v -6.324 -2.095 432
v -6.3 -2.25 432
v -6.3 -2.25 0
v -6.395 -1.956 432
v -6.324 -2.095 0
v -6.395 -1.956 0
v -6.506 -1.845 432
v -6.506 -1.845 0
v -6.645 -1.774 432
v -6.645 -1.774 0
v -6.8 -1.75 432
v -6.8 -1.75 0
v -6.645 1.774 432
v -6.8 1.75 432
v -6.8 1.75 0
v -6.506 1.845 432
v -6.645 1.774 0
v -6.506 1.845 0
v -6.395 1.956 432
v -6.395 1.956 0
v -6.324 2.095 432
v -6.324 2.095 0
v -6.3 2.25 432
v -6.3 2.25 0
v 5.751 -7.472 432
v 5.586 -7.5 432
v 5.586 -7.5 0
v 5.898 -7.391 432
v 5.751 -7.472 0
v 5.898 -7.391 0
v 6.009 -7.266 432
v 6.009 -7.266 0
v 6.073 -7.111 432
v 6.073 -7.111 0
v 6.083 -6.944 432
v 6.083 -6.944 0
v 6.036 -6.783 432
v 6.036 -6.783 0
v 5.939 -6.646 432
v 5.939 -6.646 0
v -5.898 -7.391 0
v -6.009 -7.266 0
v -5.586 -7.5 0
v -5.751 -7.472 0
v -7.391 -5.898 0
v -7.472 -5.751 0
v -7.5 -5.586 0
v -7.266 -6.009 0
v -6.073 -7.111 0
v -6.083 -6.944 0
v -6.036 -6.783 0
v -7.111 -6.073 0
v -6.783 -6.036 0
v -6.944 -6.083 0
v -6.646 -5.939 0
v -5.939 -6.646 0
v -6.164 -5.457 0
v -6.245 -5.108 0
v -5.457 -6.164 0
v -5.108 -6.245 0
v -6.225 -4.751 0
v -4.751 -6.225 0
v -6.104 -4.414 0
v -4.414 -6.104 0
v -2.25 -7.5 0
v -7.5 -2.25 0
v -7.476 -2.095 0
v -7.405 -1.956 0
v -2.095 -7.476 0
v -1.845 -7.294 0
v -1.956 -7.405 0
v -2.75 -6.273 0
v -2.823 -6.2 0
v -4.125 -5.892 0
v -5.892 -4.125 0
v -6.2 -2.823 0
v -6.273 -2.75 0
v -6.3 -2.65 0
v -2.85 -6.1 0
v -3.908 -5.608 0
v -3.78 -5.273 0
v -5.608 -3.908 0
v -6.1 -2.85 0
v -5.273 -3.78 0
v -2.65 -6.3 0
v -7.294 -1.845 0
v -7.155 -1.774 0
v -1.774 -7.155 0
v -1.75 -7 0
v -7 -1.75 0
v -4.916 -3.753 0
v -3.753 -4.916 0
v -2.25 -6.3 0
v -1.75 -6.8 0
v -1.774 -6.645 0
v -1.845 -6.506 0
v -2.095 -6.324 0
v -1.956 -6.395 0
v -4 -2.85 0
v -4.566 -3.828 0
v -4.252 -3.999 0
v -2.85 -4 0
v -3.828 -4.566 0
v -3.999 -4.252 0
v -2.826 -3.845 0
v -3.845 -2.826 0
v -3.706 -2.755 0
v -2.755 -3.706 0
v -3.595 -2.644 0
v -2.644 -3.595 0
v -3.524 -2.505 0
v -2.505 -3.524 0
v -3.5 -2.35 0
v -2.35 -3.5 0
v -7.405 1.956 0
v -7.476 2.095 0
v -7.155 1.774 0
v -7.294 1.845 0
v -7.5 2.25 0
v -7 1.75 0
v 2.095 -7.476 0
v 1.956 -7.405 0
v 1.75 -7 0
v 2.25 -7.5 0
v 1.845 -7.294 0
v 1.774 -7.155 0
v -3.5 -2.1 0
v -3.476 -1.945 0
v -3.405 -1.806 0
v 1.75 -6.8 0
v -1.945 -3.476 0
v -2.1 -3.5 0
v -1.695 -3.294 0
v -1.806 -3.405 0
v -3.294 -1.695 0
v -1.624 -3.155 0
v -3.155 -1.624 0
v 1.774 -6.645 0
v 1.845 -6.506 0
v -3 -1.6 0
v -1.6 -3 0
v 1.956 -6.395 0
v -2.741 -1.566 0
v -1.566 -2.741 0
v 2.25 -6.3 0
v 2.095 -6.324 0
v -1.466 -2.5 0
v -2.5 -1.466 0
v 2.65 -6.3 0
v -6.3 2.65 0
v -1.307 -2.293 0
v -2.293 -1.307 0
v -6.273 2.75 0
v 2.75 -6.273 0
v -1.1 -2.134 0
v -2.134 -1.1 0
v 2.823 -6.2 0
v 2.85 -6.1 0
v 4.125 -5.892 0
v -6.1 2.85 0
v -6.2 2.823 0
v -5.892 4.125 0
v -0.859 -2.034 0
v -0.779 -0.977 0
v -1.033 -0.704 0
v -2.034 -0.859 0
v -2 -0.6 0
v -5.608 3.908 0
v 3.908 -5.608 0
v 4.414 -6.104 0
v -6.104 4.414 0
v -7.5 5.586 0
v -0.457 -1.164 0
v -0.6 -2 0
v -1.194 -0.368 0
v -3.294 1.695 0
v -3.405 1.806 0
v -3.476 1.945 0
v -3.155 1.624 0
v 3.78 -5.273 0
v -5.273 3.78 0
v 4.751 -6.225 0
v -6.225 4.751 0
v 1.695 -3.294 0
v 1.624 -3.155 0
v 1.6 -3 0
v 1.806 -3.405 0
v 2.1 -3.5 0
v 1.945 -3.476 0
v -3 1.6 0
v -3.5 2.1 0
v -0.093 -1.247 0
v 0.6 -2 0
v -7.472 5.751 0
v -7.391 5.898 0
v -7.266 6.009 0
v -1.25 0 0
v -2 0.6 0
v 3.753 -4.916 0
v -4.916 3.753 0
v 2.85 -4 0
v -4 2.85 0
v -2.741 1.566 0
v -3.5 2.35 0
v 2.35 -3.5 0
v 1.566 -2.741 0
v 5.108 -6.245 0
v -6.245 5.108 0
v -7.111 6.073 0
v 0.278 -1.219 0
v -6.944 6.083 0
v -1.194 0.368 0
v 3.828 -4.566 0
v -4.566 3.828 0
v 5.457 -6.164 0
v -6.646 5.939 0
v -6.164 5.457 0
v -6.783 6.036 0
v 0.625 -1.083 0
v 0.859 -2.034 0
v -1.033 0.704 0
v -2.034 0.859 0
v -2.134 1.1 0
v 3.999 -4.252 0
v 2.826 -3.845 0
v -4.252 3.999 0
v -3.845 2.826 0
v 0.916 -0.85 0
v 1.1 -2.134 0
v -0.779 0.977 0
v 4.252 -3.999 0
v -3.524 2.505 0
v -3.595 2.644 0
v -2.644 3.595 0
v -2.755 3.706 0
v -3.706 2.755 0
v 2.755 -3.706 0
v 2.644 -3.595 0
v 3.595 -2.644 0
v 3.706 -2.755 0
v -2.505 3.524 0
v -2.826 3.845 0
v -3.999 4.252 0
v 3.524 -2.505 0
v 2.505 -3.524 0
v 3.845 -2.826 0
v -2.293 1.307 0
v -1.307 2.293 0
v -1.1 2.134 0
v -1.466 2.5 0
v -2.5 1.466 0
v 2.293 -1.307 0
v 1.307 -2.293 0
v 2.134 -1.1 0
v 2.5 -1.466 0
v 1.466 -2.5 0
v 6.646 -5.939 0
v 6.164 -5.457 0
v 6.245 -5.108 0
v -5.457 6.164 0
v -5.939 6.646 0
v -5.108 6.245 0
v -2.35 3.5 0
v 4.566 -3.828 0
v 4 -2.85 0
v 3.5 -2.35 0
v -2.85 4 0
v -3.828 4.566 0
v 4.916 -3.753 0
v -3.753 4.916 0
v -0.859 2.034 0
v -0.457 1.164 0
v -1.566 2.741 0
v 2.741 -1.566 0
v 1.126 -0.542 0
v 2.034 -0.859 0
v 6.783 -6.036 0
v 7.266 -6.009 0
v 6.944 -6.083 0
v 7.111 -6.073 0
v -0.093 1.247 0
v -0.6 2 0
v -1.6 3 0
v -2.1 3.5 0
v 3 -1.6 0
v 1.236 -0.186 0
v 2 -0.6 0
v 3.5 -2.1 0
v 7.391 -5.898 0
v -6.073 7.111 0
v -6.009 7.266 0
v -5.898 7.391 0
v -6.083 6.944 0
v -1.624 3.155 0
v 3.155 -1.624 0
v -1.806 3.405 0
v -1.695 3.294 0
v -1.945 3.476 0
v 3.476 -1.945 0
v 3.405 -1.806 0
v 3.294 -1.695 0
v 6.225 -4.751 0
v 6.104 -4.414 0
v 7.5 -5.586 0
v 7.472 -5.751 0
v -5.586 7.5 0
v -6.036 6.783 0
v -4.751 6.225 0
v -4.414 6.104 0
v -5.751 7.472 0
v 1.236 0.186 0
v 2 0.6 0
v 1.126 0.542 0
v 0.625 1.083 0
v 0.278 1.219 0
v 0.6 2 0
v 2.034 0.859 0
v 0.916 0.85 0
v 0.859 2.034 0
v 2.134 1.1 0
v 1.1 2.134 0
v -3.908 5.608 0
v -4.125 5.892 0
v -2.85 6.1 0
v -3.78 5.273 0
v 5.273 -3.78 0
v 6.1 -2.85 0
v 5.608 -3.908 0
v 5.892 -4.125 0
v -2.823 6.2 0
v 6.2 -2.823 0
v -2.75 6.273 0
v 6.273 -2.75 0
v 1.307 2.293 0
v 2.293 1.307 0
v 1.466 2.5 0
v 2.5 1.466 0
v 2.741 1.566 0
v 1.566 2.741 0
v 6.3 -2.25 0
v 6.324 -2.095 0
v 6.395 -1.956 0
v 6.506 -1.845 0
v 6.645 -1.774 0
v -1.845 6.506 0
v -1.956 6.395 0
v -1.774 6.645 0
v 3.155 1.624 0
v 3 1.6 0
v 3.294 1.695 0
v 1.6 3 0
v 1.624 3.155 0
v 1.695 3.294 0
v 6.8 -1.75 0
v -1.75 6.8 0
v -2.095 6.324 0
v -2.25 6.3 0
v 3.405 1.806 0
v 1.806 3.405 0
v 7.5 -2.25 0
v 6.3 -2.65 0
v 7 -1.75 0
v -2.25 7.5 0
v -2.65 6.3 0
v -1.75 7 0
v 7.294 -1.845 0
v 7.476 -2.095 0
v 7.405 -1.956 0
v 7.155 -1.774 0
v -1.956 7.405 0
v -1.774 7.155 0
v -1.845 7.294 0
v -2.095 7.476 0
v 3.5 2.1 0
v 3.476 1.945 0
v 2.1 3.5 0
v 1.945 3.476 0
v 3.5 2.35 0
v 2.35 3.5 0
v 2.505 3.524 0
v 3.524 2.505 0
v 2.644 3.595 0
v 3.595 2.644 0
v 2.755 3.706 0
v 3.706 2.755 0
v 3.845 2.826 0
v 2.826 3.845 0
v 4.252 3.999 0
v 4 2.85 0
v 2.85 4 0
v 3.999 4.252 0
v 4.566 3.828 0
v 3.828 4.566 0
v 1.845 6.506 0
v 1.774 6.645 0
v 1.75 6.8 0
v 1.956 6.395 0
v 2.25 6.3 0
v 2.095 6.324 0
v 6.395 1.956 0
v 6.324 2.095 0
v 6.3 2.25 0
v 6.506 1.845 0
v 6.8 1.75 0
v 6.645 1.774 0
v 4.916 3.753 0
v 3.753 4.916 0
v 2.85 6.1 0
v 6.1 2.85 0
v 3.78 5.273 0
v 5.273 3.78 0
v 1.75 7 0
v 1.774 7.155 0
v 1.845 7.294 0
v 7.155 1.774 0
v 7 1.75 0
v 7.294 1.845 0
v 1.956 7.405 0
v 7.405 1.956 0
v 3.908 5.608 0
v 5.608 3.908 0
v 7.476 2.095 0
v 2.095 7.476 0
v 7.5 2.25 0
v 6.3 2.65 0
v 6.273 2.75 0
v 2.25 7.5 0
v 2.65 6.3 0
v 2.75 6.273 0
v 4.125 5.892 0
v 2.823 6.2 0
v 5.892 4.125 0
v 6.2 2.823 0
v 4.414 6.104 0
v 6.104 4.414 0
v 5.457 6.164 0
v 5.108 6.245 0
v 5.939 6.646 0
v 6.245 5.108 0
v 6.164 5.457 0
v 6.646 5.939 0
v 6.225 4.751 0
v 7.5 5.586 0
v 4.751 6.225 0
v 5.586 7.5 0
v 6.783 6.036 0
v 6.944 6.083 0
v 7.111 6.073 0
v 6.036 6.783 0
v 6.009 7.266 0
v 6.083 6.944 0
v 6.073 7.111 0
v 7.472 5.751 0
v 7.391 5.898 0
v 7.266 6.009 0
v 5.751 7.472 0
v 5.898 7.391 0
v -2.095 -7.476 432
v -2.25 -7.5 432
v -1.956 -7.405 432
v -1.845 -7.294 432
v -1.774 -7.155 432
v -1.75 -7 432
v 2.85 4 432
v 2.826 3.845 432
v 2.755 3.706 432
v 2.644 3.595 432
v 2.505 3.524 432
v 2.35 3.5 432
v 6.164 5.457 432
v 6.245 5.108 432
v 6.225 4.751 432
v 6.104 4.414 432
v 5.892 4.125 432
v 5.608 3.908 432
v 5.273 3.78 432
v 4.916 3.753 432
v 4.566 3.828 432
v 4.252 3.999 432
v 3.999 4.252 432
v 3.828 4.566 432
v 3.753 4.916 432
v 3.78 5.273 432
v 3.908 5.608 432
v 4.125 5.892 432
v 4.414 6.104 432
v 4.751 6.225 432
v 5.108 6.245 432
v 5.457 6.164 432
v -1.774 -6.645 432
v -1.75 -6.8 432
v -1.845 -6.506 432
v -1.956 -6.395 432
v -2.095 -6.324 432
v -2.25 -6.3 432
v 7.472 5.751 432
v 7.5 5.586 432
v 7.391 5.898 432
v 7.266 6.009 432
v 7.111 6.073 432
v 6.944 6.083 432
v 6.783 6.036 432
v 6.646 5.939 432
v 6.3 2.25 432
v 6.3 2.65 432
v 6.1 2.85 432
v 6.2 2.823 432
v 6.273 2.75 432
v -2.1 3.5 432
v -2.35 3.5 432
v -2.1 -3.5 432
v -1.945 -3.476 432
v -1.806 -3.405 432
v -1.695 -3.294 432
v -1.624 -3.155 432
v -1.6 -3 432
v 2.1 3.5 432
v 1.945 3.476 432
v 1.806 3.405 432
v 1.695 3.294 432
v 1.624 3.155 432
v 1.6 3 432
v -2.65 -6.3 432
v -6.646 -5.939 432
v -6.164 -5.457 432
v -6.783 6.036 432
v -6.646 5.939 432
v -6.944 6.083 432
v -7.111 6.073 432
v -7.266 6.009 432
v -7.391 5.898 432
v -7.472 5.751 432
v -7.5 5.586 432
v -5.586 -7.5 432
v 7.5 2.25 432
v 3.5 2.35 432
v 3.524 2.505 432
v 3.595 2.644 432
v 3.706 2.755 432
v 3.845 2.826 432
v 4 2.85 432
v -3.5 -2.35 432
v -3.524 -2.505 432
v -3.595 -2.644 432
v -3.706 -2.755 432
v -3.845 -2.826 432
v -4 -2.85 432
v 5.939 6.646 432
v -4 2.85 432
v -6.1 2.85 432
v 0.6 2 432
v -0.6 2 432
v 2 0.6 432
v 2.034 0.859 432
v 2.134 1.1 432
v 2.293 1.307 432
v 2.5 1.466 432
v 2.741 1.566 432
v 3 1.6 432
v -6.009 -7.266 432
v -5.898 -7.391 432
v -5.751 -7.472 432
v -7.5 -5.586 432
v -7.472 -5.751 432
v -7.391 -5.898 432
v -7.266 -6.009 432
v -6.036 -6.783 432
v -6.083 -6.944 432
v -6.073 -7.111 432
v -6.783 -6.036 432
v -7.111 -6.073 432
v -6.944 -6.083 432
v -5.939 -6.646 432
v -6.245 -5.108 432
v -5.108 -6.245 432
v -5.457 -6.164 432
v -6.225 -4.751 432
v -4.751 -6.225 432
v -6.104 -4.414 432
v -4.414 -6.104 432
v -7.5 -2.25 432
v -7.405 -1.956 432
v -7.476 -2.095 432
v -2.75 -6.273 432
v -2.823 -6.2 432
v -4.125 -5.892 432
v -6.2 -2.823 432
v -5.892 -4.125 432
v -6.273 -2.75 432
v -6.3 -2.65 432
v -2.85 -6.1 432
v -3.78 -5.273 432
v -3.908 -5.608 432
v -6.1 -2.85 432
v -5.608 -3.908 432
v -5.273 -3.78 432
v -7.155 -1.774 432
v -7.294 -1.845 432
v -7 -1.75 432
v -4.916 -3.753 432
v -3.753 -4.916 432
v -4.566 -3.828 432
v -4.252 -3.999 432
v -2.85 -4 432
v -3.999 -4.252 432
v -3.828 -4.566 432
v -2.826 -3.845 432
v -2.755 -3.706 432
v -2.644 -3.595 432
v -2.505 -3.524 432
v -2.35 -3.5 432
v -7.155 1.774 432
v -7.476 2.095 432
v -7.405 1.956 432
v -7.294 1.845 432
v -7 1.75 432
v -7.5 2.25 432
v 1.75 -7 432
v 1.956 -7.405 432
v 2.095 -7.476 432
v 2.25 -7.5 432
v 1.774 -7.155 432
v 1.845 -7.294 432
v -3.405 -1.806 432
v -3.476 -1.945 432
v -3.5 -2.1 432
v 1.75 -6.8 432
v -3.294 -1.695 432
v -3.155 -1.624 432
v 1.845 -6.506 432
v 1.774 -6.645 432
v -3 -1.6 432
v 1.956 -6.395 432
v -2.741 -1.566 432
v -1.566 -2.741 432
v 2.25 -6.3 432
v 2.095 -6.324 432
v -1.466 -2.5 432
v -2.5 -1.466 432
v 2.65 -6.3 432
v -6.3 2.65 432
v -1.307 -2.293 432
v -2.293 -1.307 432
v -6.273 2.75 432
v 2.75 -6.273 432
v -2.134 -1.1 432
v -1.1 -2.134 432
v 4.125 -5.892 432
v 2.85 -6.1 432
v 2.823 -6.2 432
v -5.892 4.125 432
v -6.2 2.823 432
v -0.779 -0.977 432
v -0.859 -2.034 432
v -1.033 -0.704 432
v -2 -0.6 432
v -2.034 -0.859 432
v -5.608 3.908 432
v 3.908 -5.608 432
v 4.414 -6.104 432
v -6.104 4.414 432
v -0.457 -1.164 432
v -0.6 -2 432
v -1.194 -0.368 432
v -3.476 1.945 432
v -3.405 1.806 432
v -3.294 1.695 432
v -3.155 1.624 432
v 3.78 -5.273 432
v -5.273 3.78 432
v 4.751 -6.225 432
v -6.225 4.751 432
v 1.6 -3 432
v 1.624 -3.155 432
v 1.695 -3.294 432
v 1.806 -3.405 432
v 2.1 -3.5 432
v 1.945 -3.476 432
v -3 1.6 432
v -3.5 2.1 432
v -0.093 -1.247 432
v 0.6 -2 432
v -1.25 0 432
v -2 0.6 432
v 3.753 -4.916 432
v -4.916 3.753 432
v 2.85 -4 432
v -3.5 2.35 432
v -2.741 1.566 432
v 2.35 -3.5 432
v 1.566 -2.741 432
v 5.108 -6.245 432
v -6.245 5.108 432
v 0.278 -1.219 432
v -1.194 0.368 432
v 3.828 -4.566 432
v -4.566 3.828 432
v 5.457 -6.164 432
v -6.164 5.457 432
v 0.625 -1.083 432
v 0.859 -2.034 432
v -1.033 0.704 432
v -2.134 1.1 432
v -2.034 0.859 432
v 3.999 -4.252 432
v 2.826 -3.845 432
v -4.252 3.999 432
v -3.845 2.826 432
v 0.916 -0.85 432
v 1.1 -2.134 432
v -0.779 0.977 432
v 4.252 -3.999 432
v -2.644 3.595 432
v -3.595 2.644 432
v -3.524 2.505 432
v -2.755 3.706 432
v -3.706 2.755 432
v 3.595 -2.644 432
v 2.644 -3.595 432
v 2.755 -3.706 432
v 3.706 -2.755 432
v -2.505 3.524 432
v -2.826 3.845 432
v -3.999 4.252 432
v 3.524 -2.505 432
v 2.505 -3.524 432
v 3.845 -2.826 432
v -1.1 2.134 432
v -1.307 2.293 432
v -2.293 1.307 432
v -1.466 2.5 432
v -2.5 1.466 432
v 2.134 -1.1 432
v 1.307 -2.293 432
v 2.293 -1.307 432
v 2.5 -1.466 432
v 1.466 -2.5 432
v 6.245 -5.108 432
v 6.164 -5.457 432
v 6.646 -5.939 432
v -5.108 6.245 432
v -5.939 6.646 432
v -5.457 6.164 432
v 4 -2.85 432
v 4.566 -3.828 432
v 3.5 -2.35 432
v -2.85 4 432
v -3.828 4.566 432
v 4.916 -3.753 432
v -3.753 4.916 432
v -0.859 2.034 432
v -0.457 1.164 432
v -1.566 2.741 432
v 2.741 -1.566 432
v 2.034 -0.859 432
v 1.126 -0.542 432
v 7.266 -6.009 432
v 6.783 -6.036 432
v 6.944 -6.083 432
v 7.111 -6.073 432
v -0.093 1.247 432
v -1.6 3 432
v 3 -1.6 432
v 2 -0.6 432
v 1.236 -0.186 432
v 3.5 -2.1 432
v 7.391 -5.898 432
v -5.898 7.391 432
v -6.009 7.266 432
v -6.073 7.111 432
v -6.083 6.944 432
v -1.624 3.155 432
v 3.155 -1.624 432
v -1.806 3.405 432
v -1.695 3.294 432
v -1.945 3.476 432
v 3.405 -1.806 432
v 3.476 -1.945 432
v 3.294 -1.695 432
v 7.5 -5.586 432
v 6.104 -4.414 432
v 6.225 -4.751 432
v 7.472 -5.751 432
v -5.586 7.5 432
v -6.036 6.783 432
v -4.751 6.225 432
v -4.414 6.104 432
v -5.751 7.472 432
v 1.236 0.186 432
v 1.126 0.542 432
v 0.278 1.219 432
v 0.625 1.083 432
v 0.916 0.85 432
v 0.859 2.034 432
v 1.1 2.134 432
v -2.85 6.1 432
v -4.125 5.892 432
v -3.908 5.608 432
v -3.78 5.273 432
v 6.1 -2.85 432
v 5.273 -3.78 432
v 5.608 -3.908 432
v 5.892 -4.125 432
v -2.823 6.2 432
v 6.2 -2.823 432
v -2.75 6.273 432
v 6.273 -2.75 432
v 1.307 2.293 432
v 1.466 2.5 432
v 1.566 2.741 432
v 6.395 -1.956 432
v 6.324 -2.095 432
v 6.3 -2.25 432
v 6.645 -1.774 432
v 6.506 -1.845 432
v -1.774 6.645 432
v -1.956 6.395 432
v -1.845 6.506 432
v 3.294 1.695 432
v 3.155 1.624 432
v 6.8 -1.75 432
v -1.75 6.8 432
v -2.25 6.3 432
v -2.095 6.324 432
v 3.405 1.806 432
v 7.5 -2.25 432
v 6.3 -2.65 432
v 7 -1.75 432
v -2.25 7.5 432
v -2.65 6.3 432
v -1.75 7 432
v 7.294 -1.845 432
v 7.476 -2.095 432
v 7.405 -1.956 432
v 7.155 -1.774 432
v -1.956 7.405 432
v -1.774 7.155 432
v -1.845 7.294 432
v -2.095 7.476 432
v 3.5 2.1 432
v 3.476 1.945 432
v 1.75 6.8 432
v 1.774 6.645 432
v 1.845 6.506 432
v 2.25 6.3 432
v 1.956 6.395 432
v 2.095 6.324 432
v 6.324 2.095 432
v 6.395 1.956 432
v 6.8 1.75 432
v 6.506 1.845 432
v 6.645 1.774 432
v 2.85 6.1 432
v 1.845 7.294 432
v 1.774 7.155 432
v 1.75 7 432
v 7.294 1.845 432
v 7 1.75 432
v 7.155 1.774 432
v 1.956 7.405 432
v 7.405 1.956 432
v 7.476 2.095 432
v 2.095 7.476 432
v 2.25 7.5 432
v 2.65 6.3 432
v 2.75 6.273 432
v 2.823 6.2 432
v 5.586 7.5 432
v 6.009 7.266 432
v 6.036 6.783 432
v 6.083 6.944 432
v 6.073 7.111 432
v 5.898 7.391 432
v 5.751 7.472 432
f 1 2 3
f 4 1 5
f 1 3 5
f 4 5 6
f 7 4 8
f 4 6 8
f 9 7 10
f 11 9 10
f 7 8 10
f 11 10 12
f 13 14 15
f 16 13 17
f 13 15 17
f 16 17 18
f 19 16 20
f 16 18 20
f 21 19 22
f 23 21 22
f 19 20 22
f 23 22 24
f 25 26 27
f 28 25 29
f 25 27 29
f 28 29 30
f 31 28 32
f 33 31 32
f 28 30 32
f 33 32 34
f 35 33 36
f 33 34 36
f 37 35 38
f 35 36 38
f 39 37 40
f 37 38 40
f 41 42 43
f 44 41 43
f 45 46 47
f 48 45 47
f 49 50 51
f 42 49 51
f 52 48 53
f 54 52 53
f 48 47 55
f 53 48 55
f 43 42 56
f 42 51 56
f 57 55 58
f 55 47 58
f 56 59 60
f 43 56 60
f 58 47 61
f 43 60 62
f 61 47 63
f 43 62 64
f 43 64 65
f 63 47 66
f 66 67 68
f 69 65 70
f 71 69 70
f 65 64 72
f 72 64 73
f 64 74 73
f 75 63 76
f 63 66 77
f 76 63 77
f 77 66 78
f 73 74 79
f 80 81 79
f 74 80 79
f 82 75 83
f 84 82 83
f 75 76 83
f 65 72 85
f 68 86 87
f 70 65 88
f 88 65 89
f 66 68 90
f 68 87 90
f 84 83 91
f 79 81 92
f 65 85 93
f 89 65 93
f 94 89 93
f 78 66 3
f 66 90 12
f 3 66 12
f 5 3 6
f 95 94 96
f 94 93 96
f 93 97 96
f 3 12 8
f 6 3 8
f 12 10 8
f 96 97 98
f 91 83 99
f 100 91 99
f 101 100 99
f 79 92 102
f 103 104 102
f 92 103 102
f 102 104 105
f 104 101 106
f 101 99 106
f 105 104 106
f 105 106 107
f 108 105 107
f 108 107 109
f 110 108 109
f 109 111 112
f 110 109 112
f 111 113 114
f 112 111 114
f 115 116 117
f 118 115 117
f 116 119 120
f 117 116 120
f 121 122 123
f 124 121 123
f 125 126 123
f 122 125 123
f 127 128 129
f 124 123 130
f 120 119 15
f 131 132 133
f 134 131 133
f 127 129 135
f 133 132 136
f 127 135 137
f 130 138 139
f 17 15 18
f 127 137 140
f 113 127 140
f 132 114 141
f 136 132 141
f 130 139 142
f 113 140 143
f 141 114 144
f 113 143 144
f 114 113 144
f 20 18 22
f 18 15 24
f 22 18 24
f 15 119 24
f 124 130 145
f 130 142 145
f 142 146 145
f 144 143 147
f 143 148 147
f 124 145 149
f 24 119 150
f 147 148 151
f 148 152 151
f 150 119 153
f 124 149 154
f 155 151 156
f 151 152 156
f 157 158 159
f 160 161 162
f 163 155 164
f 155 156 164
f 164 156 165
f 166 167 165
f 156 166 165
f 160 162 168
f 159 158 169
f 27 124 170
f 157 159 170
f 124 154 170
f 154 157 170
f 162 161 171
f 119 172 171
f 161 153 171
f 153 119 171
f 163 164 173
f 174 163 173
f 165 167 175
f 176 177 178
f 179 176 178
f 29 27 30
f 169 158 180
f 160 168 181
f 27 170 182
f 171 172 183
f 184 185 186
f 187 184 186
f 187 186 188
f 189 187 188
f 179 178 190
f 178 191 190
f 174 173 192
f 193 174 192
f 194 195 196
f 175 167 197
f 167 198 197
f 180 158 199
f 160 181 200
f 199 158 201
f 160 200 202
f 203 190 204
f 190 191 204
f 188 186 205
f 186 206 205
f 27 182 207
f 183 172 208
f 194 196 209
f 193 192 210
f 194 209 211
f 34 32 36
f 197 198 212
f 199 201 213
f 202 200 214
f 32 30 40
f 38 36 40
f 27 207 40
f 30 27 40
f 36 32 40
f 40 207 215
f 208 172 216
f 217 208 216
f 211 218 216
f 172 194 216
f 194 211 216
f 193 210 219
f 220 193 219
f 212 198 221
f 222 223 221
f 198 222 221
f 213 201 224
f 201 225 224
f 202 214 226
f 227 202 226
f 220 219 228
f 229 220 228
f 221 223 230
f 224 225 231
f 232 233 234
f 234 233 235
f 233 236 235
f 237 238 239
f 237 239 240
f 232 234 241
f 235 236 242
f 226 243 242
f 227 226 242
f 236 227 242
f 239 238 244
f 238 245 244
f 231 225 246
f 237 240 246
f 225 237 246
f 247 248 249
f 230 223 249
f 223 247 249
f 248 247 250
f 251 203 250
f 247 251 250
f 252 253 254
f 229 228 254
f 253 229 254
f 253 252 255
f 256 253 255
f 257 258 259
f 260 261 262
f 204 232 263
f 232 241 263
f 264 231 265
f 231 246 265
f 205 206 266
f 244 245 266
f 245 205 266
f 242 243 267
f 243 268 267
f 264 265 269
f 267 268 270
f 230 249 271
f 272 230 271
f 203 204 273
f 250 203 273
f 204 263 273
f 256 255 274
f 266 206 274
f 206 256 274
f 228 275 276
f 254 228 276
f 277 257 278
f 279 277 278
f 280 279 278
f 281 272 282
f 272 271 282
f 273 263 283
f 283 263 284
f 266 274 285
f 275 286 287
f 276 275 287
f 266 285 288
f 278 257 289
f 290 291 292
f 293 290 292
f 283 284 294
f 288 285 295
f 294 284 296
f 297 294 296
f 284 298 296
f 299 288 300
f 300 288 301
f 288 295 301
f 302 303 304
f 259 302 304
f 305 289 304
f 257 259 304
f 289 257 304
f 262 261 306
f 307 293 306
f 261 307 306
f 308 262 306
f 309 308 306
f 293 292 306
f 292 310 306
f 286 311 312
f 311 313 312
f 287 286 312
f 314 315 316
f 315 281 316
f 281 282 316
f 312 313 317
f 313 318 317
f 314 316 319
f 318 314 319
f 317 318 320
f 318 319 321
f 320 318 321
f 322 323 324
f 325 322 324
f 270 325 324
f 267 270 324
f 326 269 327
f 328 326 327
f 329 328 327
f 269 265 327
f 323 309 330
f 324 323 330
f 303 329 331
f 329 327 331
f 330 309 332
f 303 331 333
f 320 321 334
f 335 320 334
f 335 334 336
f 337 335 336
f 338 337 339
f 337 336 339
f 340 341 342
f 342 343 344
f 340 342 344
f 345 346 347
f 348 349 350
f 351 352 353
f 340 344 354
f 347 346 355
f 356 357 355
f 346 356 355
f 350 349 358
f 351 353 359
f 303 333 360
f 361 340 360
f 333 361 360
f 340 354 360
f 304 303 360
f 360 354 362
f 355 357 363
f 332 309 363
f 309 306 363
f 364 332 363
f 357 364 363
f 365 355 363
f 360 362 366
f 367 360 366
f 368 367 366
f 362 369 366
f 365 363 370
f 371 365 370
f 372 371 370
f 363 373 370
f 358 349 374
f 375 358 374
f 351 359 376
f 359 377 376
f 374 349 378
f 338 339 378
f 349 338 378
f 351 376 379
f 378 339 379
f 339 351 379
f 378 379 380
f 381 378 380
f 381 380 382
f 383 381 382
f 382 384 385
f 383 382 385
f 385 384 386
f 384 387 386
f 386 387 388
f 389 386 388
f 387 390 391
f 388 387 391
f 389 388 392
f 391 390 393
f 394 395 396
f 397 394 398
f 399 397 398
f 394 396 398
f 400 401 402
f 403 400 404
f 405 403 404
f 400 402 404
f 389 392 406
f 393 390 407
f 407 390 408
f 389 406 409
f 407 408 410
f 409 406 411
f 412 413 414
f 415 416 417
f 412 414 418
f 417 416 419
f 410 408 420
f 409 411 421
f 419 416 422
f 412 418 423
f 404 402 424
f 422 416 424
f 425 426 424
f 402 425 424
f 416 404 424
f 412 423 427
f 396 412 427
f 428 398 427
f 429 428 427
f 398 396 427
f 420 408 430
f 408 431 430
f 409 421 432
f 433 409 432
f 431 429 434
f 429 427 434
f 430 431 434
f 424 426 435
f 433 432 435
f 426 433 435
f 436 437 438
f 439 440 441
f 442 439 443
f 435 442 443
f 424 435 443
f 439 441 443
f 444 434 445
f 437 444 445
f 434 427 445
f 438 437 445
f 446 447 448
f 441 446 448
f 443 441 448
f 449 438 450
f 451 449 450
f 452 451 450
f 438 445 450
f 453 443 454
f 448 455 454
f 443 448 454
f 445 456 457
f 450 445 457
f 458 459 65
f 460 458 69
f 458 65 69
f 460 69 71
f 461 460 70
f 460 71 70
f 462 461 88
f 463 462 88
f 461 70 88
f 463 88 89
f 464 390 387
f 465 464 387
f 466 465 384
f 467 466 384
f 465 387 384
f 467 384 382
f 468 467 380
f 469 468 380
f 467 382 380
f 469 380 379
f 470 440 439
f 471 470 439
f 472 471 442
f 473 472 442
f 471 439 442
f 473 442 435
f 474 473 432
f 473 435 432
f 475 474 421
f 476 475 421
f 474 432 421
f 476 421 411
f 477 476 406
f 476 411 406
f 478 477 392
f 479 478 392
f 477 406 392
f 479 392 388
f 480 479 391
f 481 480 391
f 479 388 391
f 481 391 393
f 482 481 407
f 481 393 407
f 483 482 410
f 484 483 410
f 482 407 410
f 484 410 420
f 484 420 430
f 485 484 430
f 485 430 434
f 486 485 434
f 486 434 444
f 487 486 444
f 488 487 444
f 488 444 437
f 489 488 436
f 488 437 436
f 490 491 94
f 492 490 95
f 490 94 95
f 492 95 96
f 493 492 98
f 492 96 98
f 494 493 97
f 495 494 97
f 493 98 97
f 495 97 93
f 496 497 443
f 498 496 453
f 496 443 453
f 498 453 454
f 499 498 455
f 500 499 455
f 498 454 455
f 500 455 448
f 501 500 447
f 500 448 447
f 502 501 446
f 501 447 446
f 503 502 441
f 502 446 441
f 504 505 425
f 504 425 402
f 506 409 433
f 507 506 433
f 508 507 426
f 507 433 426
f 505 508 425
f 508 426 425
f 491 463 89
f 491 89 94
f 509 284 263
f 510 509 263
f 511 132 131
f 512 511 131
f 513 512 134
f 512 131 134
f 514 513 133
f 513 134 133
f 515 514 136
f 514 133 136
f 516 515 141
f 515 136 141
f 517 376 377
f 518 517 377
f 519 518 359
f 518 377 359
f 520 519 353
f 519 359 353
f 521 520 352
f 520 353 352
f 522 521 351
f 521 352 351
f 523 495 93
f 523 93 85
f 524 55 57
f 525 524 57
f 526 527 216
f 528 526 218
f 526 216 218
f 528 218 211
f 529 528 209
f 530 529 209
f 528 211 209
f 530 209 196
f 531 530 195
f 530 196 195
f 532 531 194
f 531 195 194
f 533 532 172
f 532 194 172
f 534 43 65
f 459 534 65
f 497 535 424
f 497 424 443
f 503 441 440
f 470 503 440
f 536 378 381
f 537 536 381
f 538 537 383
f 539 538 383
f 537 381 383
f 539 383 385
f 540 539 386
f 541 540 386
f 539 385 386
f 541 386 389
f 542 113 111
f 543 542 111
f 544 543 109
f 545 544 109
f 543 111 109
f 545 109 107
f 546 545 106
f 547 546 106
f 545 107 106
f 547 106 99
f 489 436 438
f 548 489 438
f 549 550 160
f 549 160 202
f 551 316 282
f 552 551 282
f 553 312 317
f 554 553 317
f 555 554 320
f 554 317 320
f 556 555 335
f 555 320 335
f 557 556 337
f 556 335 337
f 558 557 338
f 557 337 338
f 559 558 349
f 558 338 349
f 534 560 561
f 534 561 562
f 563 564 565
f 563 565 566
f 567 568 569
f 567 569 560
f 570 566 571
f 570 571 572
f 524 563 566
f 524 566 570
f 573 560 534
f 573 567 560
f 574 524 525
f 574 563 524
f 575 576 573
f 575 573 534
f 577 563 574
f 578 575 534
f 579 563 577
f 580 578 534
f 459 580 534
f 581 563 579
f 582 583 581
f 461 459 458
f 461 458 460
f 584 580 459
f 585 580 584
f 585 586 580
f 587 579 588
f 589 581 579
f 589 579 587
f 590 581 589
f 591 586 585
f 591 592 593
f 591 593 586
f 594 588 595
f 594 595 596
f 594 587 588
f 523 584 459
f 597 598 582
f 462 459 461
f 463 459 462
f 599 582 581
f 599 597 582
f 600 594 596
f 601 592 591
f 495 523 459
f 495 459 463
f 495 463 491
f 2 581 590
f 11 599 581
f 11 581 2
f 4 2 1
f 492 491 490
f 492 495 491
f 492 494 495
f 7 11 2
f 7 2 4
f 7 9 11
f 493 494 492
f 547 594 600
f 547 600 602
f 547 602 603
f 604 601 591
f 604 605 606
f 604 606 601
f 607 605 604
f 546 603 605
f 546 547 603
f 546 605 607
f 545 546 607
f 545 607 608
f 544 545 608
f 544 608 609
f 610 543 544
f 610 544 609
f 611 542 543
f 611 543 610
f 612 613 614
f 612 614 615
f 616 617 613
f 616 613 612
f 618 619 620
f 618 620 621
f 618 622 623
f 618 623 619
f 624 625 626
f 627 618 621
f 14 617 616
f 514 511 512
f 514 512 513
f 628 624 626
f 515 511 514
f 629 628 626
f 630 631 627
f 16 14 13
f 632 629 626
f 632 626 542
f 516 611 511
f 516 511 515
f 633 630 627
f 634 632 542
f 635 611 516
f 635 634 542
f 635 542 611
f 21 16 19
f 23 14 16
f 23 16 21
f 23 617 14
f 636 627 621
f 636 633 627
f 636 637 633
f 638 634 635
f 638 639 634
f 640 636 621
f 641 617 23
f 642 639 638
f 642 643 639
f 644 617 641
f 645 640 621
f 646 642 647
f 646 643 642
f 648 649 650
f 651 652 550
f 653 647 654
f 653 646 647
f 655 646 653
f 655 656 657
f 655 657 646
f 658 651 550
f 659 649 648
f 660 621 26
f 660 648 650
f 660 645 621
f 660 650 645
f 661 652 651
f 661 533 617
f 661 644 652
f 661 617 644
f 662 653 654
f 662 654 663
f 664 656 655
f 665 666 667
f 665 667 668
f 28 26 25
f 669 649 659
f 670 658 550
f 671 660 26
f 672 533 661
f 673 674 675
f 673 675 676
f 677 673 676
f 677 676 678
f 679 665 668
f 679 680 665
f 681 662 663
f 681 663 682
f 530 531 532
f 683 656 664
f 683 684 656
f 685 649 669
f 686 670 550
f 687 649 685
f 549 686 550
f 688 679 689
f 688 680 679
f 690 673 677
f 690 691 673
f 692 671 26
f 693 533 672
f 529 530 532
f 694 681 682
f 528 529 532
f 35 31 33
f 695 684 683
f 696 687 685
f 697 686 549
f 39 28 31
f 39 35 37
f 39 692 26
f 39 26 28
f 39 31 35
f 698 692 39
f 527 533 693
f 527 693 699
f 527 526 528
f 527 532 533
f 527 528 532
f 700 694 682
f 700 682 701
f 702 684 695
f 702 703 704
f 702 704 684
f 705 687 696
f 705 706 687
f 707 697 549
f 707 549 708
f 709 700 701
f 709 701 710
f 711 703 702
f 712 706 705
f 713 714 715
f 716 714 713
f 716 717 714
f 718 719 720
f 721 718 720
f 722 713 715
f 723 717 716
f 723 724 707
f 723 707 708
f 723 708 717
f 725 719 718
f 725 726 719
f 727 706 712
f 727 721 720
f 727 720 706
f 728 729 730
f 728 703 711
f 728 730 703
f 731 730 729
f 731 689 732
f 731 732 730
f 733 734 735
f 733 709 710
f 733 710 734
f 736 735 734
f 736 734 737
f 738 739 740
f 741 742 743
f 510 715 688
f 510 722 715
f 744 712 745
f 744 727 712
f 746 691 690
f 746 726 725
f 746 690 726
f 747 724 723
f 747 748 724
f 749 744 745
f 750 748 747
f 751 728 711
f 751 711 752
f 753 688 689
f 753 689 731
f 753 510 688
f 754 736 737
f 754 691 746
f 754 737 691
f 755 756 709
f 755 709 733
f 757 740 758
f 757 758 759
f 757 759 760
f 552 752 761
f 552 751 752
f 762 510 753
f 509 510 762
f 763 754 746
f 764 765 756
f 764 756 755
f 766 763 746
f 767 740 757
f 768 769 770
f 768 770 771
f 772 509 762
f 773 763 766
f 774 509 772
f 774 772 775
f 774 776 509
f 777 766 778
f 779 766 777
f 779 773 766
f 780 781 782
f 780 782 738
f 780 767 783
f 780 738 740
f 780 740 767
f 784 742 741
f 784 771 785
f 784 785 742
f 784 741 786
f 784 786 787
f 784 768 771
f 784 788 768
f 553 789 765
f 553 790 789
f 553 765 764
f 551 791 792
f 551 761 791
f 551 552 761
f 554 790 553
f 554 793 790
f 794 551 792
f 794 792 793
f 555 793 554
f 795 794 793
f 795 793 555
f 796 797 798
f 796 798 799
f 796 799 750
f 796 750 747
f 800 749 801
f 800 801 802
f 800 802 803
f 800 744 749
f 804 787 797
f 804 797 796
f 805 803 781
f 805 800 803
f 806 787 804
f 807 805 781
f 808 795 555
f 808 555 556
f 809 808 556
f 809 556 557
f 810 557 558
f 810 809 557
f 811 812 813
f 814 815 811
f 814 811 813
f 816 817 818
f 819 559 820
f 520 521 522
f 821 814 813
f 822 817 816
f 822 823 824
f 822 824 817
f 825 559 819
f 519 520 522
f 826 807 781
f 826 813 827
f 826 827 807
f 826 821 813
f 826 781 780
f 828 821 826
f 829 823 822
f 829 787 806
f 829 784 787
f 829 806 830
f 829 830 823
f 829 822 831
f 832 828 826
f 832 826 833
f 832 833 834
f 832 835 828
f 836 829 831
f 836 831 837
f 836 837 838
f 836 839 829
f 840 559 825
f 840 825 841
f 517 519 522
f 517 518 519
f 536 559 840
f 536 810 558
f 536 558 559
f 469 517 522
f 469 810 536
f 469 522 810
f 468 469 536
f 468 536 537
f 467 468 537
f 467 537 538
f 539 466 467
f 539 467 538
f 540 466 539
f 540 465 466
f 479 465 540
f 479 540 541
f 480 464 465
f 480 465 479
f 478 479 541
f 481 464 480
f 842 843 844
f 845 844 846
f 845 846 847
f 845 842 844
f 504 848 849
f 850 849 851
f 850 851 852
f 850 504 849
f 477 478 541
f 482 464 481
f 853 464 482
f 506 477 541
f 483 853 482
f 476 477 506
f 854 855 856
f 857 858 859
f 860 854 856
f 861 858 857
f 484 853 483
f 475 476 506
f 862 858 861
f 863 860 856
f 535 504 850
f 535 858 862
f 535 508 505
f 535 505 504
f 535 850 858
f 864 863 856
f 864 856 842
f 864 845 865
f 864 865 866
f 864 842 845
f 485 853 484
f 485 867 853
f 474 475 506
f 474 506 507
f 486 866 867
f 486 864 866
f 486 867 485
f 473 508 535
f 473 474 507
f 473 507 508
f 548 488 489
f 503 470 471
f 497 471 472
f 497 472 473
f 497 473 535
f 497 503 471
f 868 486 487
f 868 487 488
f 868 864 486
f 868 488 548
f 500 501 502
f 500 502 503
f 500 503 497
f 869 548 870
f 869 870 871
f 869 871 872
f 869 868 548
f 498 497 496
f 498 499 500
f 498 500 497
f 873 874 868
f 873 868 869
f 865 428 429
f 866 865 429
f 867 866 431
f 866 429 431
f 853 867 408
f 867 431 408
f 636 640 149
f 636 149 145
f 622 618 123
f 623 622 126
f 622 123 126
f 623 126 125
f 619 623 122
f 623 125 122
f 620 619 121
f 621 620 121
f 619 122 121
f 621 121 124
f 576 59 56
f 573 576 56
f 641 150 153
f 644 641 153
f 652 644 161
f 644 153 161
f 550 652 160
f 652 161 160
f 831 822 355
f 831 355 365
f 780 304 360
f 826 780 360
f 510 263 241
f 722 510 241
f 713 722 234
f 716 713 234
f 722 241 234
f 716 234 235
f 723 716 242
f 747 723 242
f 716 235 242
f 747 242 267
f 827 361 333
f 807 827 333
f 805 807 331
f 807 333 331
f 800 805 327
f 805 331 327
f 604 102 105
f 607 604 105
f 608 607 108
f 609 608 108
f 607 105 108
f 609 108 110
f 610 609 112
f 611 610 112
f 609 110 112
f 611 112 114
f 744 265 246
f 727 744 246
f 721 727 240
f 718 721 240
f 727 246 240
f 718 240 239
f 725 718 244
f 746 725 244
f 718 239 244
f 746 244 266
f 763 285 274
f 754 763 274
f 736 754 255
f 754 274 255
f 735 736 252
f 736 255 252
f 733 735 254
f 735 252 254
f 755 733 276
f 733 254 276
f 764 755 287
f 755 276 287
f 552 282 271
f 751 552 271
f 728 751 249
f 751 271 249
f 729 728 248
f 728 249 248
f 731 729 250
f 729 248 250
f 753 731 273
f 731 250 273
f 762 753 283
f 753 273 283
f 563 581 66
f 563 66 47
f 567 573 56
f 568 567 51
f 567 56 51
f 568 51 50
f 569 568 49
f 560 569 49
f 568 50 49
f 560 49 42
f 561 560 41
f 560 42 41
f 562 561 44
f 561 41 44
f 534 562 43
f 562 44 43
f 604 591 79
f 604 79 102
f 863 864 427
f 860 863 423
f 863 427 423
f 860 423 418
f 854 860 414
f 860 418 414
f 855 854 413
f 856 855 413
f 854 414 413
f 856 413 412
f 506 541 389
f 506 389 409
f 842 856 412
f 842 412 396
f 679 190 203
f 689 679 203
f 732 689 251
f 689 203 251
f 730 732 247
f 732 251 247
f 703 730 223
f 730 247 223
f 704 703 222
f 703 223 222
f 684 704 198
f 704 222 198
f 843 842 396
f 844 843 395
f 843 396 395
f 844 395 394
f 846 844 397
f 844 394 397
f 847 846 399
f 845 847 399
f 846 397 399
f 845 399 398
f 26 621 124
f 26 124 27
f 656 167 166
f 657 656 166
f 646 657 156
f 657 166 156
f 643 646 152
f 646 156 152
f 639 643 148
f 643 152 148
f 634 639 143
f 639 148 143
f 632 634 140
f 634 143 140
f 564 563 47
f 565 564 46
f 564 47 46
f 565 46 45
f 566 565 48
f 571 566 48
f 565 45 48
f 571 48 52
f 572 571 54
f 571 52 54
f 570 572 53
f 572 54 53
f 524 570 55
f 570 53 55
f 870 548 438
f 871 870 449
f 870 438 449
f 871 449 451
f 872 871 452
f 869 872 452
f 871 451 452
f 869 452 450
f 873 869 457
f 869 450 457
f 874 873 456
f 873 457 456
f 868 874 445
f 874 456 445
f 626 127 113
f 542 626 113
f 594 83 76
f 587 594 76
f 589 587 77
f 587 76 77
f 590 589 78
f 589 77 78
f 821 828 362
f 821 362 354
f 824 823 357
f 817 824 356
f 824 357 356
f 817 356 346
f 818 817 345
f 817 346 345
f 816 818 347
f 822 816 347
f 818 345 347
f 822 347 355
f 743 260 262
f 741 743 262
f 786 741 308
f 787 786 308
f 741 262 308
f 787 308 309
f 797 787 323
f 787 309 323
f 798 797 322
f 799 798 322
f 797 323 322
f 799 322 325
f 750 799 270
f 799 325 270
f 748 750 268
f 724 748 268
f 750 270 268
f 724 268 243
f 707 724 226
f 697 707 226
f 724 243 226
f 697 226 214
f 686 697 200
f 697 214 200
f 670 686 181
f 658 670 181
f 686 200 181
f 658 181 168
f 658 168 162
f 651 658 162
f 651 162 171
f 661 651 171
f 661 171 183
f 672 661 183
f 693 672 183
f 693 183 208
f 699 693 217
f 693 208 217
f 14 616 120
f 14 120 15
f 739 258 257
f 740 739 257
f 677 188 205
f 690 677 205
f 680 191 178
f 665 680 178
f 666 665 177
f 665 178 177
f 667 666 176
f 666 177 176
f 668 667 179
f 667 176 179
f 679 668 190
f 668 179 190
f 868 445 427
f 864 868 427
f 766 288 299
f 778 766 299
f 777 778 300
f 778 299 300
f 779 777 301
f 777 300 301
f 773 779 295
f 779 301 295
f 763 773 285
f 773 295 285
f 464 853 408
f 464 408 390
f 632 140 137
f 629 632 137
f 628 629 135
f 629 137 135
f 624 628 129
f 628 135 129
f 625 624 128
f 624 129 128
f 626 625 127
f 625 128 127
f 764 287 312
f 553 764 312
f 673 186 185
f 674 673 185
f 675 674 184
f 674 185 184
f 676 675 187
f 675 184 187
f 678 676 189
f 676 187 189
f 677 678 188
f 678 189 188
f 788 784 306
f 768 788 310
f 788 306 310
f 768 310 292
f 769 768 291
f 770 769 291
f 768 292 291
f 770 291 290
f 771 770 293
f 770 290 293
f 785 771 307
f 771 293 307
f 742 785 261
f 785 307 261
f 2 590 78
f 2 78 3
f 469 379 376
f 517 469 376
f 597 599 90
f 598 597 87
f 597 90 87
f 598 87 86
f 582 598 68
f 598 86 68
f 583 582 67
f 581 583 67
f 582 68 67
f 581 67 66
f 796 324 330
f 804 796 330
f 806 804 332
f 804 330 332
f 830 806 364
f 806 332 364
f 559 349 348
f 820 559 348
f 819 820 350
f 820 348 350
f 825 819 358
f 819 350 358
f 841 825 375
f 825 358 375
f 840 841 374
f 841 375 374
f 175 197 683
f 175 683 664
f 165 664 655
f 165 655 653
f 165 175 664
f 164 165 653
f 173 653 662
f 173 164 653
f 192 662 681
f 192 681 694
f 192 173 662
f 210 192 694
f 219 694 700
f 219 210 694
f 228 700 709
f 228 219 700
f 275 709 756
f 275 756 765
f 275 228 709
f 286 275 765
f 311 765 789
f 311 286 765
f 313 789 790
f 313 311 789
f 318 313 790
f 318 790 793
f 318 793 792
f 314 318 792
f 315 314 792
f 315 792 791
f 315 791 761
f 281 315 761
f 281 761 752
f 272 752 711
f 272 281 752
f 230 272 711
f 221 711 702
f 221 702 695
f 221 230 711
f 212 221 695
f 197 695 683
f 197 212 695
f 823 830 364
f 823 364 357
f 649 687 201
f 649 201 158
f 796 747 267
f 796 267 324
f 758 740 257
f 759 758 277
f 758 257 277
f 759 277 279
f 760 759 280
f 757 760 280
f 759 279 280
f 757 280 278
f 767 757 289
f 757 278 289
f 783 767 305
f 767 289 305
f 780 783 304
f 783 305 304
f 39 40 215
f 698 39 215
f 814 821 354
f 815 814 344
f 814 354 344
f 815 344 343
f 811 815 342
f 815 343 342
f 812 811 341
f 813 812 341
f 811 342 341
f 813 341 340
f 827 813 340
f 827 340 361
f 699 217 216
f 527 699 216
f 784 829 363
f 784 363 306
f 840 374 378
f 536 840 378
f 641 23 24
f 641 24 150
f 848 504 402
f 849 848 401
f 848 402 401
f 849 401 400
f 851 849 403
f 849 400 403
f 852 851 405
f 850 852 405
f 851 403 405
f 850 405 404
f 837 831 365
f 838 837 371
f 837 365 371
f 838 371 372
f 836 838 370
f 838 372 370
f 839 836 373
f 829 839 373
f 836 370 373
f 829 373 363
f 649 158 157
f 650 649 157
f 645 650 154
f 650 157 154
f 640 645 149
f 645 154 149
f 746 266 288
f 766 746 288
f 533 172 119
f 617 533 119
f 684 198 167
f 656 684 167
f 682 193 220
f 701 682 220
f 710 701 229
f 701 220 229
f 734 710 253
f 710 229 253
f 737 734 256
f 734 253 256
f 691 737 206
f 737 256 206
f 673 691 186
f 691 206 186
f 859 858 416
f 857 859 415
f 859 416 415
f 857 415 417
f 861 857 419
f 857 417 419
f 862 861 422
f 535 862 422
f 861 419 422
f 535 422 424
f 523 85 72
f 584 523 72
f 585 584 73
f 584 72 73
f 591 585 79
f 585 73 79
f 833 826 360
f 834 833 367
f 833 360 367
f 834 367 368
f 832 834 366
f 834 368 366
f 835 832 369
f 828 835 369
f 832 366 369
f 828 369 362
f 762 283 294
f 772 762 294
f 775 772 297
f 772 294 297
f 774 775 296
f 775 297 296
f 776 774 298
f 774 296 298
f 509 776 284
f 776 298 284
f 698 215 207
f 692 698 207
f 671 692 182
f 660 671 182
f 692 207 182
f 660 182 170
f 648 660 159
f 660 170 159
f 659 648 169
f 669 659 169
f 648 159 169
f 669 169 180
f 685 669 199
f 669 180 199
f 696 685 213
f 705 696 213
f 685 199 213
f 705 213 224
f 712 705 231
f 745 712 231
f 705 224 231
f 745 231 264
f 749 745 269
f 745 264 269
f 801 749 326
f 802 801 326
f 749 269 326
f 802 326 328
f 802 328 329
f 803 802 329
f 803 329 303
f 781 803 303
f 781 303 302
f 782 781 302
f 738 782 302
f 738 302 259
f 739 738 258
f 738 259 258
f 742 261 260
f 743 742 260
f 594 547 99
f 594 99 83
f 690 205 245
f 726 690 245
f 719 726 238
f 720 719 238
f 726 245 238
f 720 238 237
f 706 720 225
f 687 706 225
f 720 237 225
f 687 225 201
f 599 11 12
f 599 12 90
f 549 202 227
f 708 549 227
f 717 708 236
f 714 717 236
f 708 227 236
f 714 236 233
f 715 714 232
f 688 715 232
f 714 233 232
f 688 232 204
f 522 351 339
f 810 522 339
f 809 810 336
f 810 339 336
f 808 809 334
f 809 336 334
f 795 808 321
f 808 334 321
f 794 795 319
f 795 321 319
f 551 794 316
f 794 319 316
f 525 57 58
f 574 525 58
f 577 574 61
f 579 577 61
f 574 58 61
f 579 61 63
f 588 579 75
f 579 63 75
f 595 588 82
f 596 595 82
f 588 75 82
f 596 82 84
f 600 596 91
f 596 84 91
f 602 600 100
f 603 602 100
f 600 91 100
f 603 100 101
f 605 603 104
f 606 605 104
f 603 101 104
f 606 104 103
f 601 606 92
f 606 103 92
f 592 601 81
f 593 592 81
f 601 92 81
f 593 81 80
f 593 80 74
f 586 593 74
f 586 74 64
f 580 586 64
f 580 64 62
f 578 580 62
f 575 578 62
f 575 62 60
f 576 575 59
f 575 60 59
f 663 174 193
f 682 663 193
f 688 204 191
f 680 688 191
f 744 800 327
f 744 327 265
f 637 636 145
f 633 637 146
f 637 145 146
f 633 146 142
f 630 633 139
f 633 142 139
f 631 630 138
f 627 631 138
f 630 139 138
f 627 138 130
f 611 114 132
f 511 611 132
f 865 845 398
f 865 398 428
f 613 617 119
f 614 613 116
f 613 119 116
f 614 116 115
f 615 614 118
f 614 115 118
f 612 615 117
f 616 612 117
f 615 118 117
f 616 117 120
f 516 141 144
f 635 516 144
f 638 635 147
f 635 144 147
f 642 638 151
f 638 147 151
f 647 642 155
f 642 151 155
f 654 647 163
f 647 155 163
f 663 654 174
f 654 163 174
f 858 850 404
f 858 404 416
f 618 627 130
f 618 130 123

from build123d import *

# Parameters (mm, degrees)
SKETCH1_R           = 1.25
BOSS_EXTRUDE1_DEPTH = 432


with BuildPart() as part:
    # Sketch1 → Boss-Extrude1 (new body)
    with BuildSketch(Plane.XY):
        with BuildLine():
            Line((6.646446609, 5.939339828), (6.163645978, 5.456539197))
            ThreePointArc((6.163645978, 5.456539197), (4.116116524, 4.116116524), (5.456539197, 6.163645978))
            Line((5.456539197, 6.163645978), (5.939339828, 6.646446609))
            ThreePointArc((5.939339828, 6.646446609), (6.047726204, 7.191341716), (5.585786438, 7.5))
            Line((5.585786438, 7.5), (2.25, 7.5))
            ThreePointArc((2.25, 7.5), (1.896446609, 7.353553391), (1.75, 7))
            Line((1.75, 7), (1.75, 6.8))
            ThreePointArc((1.75, 6.8), (1.896446609, 6.446446609), (2.25, 6.3))
            Line((2.25, 6.3), (2.65, 6.3))
            ThreePointArc((2.65, 6.3), (2.791421356, 6.241421356), (2.85, 6.1))
            Line((2.85, 6.1), (2.85, 4))
            ThreePointArc((2.85, 4), (2.703553391, 3.646446609), (2.35, 3.5))
            Line((2.35, 3.5), (2.1, 3.5))
            ThreePointArc((2.1, 3.5), (1.746446609, 3.353553391), (1.6, 3))
            ThreePointArc((1.6, 3), (1.307106781, 2.292893219), (0.6, 2))
            Line((0.6, 2), (-0.6, 2))
            ThreePointArc((-0.6, 2), (-1.307106781, 2.292893219), (-1.6, 3))
            ThreePointArc((-1.6, 3), (-1.746446609, 3.353553391), (-2.1, 3.5))
            Line((-2.1, 3.5), (-2.35, 3.5))
            ThreePointArc((-2.35, 3.5), (-2.703553391, 3.646446609), (-2.85, 4))
            Line((-2.85, 4), (-2.85, 6.1))
            ThreePointArc((-2.85, 6.1), (-2.791421356, 6.241421356), (-2.65, 6.3))
            Line((-2.65, 6.3), (-2.25, 6.3))
            ThreePointArc((-2.25, 6.3), (-1.896446609, 6.446446609), (-1.75, 6.8))
            Line((-1.75, 6.8), (-1.75, 7))
            ThreePointArc((-1.75, 7), (-1.896446609, 7.353553391), (-2.25, 7.5))
            Line((-2.25, 7.5), (-5.585786438, 7.5))
            ThreePointArc((-5.585786438, 7.5), (-6.047726204, 7.191341716), (-5.939339828, 6.646446609))
            Line((-5.939339828, 6.646446609), (-5.456539197, 6.163645978))
            ThreePointArc((-5.456539197, 6.163645978), (-4.116116524, 4.116116524), (-6.163645978, 5.456539197))
            Line((-6.163645978, 5.456539197), (-6.646446609, 5.939339828))
            ThreePointArc((-6.646446609, 5.939339828), (-7.191341716, 6.047726204), (-7.5, 5.585786438))
            Line((-7.5, 5.585786438), (-7.5, 2.25))
            ThreePointArc((-7.5, 2.25), (-7.353553391, 1.896446609), (-7, 1.75))
            Line((-7, 1.75), (-6.8, 1.75))
            ThreePointArc((-6.8, 1.75), (-6.446446609, 1.896446609), (-6.3, 2.25))
            Line((-6.3, 2.25), (-6.3, 2.65))
            ThreePointArc((-6.3, 2.65), (-6.241421356, 2.791421356), (-6.1, 2.85))
            Line((-6.1, 2.85), (-4, 2.85))
            ThreePointArc((-4, 2.85), (-3.646446609, 2.703553391), (-3.5, 2.35))
            Line((-3.5, 2.35), (-3.5, 2.1))
            ThreePointArc((-3.5, 2.1), (-3.353553391, 1.746446609), (-3, 1.6))
            ThreePointArc((-3, 1.6), (-2.292893219, 1.307106781), (-2, 0.6))
            Line((-2, 0.6), (-2, -0.6))
            ThreePointArc((-2, -0.6), (-2.292893219, -1.307106781), (-3, -1.6))
            ThreePointArc((-3, -1.6), (-3.353553391, -1.746446609), (-3.5, -2.1))
            Line((-3.5, -2.1), (-3.5, -2.35))
            ThreePointArc((-3.5, -2.35), (-3.646446609, -2.703553391), (-4, -2.85))
            Line((-4, -2.85), (-6.1, -2.85))
            ThreePointArc((-6.1, -2.85), (-6.241421356, -2.791421356), (-6.3, -2.65))
            Line((-6.3, -2.65), (-6.3, -2.25))
            ThreePointArc((-6.3, -2.25), (-6.446446609, -1.896446609), (-6.8, -1.75))
            Line((-6.8, -1.75), (-7, -1.75))
            ThreePointArc((-7, -1.75), (-7.353553391, -1.896446609), (-7.5, -2.25))
            Line((-7.5, -2.25), (-7.5, -5.585786438))
            ThreePointArc((-7.5, -5.585786438), (-7.191341716, -6.047726204), (-6.646446609, -5.939339828))
            Line((-6.646446609, -5.939339828), (-6.163645978, -5.456539197))
            ThreePointArc((-6.163645978, -5.456539197), (-4.116116524, -4.116116524), (-5.456539197, -6.163645978))
            Line((-5.456539197, -6.163645978), (-5.939339828, -6.646446609))
            ThreePointArc((-5.939339828, -6.646446609), (-6.047726204, -7.191341716), (-5.585786438, -7.5))
            Line((-5.585786438, -7.5), (-2.25, -7.5))
            ThreePointArc((-2.25, -7.5), (-1.896446609, -7.353553391), (-1.75, -7))
            Line((-1.75, -7), (-1.75, -6.8))
            ThreePointArc((-1.75, -6.8), (-1.896446609, -6.446446609), (-2.25, -6.3))
            Line((-2.25, -6.3), (-2.65, -6.3))
            ThreePointArc((-2.65, -6.3), (-2.791421356, -6.241421356), (-2.85, -6.1))
            Line((-2.85, -6.1), (-2.85, -4))
            ThreePointArc((-2.85, -4), (-2.703553391, -3.646446609), (-2.35, -3.5))
            Line((-2.35, -3.5), (-2.1, -3.5))
            ThreePointArc((-2.1, -3.5), (-1.746446609, -3.353553391), (-1.6, -3))
            ThreePointArc((-1.6, -3), (-1.307106781, -2.292893219), (-0.6, -2))
            Line((-0.6, -2), (0.6, -2))
            ThreePointArc((0.6, -2), (1.307106781, -2.292893219), (1.6, -3))
            ThreePointArc((1.6, -3), (1.746446609, -3.353553391), (2.1, -3.5))
            Line((2.1, -3.5), (2.35, -3.5))
            ThreePointArc((2.35, -3.5), (2.703553391, -3.646446609), (2.85, -4))
            Line((2.85, -4), (2.85, -6.1))
            ThreePointArc((2.85, -6.1), (2.791421356, -6.241421356), (2.65, -6.3))
            Line((2.65, -6.3), (2.25, -6.3))
            ThreePointArc((2.25, -6.3), (1.896446609, -6.446446609), (1.75, -6.8))
            Line((1.75, -6.8), (1.75, -7))
            ThreePointArc((1.75, -7), (1.896446609, -7.353553391), (2.25, -7.5))
            Line((2.25, -7.5), (5.585786438, -7.5))
            ThreePointArc((5.585786438, -7.5), (6.047726204, -7.191341716), (5.939339828, -6.646446609))
            Line((5.939339828, -6.646446609), (5.456539197, -6.163645978))
            ThreePointArc((5.456539197, -6.163645978), (4.116116524, -4.116116524), (6.163645978, -5.456539197))
            Line((6.163645978, -5.456539197), (6.646446609, -5.939339828))
            ThreePointArc((6.646446609, -5.939339828), (7.191341716, -6.047726204), (7.5, -5.585786438))
            Line((7.5, -5.585786438), (7.5, -2.25))
            ThreePointArc((7.5, -2.25), (7.353553391, -1.896446609), (7, -1.75))
            Line((7, -1.75), (6.8, -1.75))
            ThreePointArc((6.8, -1.75), (6.446446609, -1.896446609), (6.3, -2.25))
            Line((6.3, -2.25), (6.3, -2.65))
            ThreePointArc((6.3, -2.65), (6.241421356, -2.791421356), (6.1, -2.85))
            Line((6.1, -2.85), (4, -2.85))
            ThreePointArc((4, -2.85), (3.646446609, -2.703553391), (3.5, -2.35))
            Line((3.5, -2.35), (3.5, -2.1))
            ThreePointArc((3.5, -2.1), (3.353553391, -1.746446609), (3, -1.6))
            ThreePointArc((3, -1.6), (2.292893219, -1.307106781), (2, -0.6))
            Line((2, -0.6), (2, 0.6))
            ThreePointArc((2, 0.6), (2.292893219, 1.307106781), (3, 1.6))
            ThreePointArc((3, 1.6), (3.353553391, 1.746446609), (3.5, 2.1))
            Line((3.5, 2.1), (3.5, 2.35))
            ThreePointArc((3.5, 2.35), (3.646446609, 2.703553391), (4, 2.85))
            Line((4, 2.85), (6.1, 2.85))
            ThreePointArc((6.1, 2.85), (6.241421356, 2.791421356), (6.3, 2.65))
            Line((6.3, 2.65), (6.3, 2.25))
            ThreePointArc((6.3, 2.25), (6.446446609, 1.896446609), (6.8, 1.75))
            Line((6.8, 1.75), (7, 1.75))
            ThreePointArc((7, 1.75), (7.353553391, 1.896446609), (7.5, 2.25))
            Line((7.5, 2.25), (7.5, 5.585786438))
            ThreePointArc((7.5, 5.585786438), (7.191341716, 6.047726204), (6.646446609, 5.939339828))
        make_face()
        with Locations(Location((0, 0, 0), (0, 0, 180))):
            Circle(SKETCH1_R, mode=Mode.SUBTRACT)
    extrude(amount=BOSS_EXTRUDE1_DEPTH)


solid = part.part
